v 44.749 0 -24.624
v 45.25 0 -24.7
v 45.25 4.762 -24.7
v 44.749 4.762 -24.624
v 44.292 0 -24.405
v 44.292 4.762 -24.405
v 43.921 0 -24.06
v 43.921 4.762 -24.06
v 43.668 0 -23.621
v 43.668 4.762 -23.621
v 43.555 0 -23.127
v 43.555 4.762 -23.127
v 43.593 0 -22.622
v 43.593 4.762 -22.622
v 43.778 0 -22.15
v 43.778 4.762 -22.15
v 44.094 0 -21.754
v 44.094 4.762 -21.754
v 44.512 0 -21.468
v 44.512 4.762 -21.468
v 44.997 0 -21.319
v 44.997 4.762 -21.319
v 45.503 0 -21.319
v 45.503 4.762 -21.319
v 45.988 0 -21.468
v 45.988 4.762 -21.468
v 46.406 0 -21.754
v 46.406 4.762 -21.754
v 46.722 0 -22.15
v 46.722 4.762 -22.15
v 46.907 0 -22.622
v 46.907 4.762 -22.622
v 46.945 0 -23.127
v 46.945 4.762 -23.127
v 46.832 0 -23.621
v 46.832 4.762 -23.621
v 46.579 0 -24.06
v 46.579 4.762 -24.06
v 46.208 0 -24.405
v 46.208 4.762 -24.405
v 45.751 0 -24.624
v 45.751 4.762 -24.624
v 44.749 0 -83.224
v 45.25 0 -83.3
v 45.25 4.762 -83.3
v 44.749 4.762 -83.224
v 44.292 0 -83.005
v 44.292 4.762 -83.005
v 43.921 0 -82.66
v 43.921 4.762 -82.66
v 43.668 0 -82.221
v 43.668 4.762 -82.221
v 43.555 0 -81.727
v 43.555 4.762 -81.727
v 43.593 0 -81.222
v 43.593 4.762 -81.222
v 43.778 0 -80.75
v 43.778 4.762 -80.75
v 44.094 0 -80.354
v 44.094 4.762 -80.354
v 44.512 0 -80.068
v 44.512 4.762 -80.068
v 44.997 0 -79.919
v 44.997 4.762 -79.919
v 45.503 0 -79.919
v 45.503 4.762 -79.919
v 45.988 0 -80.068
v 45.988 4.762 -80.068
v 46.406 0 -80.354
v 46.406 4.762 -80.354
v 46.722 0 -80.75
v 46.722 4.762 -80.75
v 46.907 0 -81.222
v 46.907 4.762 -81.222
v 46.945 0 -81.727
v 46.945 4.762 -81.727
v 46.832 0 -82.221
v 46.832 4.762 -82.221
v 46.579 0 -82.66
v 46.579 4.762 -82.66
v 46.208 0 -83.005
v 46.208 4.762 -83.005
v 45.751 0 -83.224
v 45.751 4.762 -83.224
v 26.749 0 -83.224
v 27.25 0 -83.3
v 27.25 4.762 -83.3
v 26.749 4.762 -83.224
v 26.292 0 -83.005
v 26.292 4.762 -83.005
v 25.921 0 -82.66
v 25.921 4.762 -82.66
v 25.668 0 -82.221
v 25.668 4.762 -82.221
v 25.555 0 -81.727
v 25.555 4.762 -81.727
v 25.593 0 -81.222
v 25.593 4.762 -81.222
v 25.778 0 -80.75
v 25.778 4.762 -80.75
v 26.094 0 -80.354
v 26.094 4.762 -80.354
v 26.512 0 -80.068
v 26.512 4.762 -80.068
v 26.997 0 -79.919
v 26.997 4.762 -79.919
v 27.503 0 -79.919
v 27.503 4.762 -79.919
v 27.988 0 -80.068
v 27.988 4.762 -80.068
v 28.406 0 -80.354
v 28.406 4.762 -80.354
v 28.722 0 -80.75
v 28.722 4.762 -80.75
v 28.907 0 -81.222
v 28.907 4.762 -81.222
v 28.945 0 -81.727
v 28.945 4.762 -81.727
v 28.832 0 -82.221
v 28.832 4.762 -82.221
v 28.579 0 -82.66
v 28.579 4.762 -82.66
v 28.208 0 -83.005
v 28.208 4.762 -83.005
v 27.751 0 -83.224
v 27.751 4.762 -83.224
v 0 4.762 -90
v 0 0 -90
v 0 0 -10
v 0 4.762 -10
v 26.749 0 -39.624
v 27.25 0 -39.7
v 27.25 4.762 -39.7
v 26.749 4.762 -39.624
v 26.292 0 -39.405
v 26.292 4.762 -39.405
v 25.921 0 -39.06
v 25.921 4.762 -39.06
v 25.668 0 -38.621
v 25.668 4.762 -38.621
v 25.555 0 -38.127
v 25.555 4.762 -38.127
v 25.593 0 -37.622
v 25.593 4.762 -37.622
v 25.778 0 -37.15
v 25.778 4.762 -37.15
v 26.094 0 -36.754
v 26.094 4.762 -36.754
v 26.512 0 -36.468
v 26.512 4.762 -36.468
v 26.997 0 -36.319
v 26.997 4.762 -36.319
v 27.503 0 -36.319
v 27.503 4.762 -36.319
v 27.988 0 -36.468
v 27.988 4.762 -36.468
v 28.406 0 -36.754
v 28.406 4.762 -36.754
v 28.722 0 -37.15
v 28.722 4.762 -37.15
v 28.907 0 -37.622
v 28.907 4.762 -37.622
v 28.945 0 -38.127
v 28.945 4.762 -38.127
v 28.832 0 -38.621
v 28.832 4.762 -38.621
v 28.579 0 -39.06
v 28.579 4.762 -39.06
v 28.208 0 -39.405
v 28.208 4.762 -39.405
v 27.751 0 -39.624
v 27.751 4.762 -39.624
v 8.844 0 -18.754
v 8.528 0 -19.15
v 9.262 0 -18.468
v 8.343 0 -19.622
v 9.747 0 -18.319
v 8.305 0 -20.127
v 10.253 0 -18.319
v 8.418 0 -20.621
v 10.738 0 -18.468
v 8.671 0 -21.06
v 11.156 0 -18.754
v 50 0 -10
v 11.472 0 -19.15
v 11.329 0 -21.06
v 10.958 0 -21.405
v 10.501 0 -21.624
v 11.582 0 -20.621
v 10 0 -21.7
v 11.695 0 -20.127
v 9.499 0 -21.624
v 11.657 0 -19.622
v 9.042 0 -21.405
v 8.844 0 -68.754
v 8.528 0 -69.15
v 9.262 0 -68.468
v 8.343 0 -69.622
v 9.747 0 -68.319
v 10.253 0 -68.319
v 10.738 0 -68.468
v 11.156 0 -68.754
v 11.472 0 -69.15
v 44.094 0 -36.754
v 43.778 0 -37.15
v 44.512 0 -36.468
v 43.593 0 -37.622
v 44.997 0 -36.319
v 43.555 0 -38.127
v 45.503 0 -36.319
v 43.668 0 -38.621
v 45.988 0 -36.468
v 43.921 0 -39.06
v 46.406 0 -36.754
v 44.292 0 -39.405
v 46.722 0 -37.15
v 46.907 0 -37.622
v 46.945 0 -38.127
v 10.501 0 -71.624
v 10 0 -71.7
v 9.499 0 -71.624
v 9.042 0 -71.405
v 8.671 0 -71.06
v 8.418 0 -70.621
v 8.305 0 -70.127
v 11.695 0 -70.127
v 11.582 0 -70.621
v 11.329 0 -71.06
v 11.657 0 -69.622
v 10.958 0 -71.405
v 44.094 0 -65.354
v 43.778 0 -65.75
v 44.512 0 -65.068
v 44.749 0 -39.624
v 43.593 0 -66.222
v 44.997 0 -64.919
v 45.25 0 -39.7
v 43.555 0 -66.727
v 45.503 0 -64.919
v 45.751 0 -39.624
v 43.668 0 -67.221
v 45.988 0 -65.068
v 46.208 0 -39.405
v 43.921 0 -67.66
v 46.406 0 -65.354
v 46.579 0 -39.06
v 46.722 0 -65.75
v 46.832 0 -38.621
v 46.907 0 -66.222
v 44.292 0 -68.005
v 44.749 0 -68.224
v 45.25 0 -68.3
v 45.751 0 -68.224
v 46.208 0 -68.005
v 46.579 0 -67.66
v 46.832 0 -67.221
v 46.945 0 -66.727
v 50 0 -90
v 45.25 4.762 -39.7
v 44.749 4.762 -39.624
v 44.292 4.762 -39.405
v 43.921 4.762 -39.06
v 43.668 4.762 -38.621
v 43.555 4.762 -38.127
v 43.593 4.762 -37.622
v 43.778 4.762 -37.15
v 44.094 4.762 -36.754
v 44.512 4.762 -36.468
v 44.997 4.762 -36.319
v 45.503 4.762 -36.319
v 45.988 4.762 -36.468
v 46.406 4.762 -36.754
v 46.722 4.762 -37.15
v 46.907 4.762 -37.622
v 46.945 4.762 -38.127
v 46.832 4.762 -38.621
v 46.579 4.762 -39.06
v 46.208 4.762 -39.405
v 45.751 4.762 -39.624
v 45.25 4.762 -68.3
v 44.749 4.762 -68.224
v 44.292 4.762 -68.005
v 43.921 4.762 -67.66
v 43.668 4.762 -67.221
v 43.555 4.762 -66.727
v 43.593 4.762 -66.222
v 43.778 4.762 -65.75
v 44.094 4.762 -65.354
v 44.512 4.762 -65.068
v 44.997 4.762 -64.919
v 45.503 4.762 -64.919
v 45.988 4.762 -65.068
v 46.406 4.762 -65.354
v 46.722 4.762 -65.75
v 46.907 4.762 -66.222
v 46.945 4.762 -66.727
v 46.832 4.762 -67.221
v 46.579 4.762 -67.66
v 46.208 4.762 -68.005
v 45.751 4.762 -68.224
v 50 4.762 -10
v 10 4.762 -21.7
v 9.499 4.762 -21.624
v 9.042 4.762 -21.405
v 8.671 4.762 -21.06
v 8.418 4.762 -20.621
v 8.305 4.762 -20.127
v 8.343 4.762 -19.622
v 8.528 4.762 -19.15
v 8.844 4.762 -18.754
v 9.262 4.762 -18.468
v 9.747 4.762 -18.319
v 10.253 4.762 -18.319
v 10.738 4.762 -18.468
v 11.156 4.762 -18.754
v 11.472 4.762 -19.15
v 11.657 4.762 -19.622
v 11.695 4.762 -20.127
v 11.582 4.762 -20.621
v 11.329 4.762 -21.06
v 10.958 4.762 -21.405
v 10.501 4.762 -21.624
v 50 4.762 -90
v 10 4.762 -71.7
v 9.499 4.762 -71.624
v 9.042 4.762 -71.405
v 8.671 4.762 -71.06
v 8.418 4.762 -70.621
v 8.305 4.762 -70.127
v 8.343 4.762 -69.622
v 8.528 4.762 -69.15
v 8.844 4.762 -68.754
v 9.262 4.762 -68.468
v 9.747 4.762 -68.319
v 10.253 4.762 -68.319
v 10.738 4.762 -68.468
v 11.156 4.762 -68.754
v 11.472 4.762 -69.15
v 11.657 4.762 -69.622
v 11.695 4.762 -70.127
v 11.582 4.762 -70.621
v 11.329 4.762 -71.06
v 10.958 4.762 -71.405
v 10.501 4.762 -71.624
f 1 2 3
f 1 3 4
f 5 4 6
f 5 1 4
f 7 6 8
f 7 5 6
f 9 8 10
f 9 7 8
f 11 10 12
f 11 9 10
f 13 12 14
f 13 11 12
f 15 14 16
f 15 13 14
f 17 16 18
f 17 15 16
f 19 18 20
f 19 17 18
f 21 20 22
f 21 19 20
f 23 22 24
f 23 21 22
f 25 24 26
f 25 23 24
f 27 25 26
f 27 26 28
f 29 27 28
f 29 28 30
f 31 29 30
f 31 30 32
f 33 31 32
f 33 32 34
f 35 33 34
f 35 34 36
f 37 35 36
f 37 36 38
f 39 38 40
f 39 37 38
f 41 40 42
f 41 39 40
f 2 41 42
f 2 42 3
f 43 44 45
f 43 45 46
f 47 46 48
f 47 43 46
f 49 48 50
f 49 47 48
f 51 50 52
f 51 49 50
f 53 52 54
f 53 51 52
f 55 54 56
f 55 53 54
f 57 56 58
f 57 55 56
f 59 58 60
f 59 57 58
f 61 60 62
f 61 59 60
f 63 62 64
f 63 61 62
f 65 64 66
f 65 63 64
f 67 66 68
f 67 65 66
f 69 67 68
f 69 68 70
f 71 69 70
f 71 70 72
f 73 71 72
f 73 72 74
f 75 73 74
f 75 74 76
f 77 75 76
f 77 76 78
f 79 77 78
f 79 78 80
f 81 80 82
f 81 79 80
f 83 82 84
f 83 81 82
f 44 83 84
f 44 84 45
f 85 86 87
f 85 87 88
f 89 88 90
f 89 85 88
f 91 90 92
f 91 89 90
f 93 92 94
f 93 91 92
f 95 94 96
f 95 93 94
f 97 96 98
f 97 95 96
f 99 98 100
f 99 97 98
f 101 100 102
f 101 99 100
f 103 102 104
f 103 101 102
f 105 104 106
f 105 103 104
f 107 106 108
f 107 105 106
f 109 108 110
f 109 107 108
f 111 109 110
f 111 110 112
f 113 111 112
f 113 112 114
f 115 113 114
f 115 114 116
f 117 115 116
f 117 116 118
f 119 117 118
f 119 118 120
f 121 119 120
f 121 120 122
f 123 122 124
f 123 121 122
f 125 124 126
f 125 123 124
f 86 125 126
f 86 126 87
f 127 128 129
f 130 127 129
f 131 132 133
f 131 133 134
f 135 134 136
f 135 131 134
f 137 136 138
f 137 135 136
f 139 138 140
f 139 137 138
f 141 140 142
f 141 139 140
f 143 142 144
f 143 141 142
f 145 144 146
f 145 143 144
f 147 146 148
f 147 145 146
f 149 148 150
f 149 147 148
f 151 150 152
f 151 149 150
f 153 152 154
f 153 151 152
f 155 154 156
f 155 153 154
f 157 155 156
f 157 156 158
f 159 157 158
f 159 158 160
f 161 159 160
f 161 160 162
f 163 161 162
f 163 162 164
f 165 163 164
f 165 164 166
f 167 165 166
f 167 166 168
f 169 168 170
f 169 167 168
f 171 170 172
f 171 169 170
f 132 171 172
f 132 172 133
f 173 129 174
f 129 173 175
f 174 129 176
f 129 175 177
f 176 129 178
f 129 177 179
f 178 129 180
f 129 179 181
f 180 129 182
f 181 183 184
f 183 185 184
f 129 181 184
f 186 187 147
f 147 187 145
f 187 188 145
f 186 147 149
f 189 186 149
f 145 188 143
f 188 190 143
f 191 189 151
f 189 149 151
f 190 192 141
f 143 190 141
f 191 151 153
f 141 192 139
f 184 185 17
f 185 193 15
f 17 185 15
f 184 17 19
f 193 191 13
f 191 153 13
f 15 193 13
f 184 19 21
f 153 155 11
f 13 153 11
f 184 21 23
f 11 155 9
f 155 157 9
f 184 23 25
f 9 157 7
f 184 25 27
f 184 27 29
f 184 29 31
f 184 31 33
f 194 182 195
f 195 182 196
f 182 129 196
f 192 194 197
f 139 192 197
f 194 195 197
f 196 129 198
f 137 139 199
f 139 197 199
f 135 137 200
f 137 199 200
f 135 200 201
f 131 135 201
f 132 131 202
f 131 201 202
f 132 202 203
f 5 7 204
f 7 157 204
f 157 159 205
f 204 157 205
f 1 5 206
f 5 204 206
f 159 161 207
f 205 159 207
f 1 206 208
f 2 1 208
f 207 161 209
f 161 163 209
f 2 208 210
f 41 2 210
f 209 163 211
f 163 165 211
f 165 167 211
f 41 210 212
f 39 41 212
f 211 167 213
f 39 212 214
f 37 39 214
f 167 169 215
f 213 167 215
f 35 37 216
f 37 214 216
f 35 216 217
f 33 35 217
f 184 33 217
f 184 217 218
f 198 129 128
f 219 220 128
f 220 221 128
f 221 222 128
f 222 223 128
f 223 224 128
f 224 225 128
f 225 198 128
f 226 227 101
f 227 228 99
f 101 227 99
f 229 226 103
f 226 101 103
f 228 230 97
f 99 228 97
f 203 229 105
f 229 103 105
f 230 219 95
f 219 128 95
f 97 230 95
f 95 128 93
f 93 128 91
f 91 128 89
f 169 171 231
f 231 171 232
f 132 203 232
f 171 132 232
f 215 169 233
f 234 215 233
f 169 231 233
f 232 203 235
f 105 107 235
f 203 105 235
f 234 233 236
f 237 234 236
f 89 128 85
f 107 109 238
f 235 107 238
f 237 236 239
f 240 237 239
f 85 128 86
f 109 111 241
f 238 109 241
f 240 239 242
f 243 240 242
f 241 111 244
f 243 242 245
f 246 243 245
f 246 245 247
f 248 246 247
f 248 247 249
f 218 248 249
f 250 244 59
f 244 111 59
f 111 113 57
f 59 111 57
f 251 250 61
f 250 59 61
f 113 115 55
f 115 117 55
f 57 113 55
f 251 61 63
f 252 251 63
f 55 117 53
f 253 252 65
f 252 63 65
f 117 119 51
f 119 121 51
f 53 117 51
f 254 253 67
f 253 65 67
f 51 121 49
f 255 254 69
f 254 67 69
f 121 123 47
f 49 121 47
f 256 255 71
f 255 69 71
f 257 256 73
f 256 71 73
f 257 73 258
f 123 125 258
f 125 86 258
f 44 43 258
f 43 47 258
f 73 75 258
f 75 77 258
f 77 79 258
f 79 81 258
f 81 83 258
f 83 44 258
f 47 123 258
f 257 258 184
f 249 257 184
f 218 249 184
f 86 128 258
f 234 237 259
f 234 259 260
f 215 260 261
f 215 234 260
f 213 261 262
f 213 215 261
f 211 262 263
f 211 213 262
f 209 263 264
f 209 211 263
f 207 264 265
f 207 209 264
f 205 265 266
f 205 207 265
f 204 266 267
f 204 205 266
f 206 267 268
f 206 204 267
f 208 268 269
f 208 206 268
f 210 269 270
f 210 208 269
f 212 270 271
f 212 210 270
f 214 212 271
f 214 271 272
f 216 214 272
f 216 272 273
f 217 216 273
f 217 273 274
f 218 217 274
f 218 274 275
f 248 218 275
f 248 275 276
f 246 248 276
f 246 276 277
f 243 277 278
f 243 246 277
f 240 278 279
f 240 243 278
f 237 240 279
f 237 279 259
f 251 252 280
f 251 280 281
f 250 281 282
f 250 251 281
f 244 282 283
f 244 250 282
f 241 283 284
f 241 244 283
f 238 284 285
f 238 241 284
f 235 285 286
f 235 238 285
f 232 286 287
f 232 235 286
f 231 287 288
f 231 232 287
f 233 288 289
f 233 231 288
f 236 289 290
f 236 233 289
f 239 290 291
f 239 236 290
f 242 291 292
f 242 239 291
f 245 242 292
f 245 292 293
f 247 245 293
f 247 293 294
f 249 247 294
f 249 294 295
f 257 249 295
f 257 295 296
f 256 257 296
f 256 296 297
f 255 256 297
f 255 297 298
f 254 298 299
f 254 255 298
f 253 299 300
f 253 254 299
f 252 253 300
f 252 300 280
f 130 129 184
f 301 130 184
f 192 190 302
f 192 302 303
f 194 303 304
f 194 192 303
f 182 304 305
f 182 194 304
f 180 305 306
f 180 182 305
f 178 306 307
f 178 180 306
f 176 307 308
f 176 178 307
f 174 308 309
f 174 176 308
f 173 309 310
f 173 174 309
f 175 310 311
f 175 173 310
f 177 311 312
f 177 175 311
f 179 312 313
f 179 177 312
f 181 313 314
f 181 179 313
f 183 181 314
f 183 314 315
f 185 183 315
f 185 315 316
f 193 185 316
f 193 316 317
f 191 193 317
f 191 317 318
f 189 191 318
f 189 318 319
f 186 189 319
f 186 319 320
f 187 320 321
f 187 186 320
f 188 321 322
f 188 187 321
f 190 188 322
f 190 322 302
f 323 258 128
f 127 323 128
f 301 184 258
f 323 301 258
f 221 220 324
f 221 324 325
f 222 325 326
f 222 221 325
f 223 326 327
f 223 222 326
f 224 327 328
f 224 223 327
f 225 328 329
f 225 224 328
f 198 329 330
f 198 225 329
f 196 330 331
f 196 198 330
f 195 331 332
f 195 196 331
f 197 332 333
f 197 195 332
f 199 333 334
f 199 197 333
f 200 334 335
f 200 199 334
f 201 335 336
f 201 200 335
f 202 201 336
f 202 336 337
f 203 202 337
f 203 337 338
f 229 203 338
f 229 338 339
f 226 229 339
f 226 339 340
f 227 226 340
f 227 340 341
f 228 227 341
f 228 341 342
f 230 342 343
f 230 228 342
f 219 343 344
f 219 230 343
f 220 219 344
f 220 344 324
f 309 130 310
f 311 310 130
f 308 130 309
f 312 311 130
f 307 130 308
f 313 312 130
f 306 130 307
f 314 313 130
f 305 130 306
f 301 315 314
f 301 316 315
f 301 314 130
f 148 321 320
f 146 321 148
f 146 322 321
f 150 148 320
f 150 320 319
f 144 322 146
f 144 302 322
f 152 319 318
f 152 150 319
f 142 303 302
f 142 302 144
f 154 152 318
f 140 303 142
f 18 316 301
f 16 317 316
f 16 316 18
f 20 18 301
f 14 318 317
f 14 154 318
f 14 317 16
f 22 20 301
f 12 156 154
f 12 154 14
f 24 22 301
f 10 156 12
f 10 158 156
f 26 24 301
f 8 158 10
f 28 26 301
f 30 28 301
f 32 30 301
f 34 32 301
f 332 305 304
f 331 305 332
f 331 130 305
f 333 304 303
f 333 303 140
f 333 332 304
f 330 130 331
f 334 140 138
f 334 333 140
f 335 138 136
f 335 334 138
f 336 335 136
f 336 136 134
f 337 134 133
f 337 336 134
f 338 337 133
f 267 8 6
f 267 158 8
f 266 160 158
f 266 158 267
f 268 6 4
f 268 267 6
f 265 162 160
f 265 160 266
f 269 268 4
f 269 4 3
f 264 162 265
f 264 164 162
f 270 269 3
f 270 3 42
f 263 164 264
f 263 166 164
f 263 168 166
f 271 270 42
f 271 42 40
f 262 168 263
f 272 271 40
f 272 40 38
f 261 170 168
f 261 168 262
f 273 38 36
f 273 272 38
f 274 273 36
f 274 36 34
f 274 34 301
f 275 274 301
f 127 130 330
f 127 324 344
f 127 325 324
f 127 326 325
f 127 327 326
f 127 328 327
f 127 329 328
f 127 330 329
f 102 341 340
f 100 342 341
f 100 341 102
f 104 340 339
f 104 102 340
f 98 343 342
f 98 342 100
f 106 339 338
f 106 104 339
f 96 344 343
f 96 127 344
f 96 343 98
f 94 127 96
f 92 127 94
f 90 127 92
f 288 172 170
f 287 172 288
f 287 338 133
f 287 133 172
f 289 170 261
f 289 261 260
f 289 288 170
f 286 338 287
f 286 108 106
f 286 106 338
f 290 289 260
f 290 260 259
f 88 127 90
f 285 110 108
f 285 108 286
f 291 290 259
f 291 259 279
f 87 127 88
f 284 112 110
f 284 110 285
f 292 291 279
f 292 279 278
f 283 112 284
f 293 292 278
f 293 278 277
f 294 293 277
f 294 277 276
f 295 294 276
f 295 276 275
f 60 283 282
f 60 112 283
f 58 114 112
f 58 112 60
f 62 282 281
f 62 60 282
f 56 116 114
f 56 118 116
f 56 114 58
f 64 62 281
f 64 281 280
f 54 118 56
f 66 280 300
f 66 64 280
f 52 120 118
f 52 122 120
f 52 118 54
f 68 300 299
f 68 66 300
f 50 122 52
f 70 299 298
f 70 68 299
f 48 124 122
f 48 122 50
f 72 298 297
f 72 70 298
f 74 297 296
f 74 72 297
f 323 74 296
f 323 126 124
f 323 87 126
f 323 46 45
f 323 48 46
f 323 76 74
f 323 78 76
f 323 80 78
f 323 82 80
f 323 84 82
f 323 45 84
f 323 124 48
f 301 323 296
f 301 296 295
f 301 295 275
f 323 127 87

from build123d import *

# Parameters (mm, degrees)
SKETCH1_R           = 1.7
BOSS_EXTRUDE1_DEPTH = 4.7625


with BuildPart() as part:
    # Sketch1 → Boss-Extrude1 (new body)
    with BuildSketch(Plane(origin=(0, 0, 0), x_dir=(1, 0, 0), z_dir=(0, 1, 0))):
        Polygon((0, 90), (0, 10), (20, 10), (50, 10), (50, 90), align=None)
        with Locations(Location((10, 20, 0), (0, 0, 90))):
            Circle(SKETCH1_R, mode=Mode.SUBTRACT)
        with Locations(Location((27.25, 38, 0), (0, 0, 90))):
            Circle(SKETCH1_R, mode=Mode.SUBTRACT)
        with Locations(Location((45.25, 23, 0), (0, 0, 90))):
            Circle(SKETCH1_R, mode=Mode.SUBTRACT)
        with Locations(Location((45.25, 38, 0), (0, 0, 90))):
            Circle(SKETCH1_R, mode=Mode.SUBTRACT)
        with Locations(Location((10, 70, 0), (0, 0, 90))):
            Circle(SKETCH1_R, mode=Mode.SUBTRACT)
        with Locations(Location((45.25, 66.6, 0), (0, 0, 90))):
            Circle(SKETCH1_R, mode=Mode.SUBTRACT)
        with Locations(Location((27.25, 81.6, 0), (0, 0, 90))):
            Circle(SKETCH1_R, mode=Mode.SUBTRACT)
        with Locations(Location((45.25, 81.6, 0), (0, 0, 90))):
            Circle(SKETCH1_R, mode=Mode.SUBTRACT)
    extrude(amount=BOSS_EXTRUDE1_DEPTH)


solid = part.part
